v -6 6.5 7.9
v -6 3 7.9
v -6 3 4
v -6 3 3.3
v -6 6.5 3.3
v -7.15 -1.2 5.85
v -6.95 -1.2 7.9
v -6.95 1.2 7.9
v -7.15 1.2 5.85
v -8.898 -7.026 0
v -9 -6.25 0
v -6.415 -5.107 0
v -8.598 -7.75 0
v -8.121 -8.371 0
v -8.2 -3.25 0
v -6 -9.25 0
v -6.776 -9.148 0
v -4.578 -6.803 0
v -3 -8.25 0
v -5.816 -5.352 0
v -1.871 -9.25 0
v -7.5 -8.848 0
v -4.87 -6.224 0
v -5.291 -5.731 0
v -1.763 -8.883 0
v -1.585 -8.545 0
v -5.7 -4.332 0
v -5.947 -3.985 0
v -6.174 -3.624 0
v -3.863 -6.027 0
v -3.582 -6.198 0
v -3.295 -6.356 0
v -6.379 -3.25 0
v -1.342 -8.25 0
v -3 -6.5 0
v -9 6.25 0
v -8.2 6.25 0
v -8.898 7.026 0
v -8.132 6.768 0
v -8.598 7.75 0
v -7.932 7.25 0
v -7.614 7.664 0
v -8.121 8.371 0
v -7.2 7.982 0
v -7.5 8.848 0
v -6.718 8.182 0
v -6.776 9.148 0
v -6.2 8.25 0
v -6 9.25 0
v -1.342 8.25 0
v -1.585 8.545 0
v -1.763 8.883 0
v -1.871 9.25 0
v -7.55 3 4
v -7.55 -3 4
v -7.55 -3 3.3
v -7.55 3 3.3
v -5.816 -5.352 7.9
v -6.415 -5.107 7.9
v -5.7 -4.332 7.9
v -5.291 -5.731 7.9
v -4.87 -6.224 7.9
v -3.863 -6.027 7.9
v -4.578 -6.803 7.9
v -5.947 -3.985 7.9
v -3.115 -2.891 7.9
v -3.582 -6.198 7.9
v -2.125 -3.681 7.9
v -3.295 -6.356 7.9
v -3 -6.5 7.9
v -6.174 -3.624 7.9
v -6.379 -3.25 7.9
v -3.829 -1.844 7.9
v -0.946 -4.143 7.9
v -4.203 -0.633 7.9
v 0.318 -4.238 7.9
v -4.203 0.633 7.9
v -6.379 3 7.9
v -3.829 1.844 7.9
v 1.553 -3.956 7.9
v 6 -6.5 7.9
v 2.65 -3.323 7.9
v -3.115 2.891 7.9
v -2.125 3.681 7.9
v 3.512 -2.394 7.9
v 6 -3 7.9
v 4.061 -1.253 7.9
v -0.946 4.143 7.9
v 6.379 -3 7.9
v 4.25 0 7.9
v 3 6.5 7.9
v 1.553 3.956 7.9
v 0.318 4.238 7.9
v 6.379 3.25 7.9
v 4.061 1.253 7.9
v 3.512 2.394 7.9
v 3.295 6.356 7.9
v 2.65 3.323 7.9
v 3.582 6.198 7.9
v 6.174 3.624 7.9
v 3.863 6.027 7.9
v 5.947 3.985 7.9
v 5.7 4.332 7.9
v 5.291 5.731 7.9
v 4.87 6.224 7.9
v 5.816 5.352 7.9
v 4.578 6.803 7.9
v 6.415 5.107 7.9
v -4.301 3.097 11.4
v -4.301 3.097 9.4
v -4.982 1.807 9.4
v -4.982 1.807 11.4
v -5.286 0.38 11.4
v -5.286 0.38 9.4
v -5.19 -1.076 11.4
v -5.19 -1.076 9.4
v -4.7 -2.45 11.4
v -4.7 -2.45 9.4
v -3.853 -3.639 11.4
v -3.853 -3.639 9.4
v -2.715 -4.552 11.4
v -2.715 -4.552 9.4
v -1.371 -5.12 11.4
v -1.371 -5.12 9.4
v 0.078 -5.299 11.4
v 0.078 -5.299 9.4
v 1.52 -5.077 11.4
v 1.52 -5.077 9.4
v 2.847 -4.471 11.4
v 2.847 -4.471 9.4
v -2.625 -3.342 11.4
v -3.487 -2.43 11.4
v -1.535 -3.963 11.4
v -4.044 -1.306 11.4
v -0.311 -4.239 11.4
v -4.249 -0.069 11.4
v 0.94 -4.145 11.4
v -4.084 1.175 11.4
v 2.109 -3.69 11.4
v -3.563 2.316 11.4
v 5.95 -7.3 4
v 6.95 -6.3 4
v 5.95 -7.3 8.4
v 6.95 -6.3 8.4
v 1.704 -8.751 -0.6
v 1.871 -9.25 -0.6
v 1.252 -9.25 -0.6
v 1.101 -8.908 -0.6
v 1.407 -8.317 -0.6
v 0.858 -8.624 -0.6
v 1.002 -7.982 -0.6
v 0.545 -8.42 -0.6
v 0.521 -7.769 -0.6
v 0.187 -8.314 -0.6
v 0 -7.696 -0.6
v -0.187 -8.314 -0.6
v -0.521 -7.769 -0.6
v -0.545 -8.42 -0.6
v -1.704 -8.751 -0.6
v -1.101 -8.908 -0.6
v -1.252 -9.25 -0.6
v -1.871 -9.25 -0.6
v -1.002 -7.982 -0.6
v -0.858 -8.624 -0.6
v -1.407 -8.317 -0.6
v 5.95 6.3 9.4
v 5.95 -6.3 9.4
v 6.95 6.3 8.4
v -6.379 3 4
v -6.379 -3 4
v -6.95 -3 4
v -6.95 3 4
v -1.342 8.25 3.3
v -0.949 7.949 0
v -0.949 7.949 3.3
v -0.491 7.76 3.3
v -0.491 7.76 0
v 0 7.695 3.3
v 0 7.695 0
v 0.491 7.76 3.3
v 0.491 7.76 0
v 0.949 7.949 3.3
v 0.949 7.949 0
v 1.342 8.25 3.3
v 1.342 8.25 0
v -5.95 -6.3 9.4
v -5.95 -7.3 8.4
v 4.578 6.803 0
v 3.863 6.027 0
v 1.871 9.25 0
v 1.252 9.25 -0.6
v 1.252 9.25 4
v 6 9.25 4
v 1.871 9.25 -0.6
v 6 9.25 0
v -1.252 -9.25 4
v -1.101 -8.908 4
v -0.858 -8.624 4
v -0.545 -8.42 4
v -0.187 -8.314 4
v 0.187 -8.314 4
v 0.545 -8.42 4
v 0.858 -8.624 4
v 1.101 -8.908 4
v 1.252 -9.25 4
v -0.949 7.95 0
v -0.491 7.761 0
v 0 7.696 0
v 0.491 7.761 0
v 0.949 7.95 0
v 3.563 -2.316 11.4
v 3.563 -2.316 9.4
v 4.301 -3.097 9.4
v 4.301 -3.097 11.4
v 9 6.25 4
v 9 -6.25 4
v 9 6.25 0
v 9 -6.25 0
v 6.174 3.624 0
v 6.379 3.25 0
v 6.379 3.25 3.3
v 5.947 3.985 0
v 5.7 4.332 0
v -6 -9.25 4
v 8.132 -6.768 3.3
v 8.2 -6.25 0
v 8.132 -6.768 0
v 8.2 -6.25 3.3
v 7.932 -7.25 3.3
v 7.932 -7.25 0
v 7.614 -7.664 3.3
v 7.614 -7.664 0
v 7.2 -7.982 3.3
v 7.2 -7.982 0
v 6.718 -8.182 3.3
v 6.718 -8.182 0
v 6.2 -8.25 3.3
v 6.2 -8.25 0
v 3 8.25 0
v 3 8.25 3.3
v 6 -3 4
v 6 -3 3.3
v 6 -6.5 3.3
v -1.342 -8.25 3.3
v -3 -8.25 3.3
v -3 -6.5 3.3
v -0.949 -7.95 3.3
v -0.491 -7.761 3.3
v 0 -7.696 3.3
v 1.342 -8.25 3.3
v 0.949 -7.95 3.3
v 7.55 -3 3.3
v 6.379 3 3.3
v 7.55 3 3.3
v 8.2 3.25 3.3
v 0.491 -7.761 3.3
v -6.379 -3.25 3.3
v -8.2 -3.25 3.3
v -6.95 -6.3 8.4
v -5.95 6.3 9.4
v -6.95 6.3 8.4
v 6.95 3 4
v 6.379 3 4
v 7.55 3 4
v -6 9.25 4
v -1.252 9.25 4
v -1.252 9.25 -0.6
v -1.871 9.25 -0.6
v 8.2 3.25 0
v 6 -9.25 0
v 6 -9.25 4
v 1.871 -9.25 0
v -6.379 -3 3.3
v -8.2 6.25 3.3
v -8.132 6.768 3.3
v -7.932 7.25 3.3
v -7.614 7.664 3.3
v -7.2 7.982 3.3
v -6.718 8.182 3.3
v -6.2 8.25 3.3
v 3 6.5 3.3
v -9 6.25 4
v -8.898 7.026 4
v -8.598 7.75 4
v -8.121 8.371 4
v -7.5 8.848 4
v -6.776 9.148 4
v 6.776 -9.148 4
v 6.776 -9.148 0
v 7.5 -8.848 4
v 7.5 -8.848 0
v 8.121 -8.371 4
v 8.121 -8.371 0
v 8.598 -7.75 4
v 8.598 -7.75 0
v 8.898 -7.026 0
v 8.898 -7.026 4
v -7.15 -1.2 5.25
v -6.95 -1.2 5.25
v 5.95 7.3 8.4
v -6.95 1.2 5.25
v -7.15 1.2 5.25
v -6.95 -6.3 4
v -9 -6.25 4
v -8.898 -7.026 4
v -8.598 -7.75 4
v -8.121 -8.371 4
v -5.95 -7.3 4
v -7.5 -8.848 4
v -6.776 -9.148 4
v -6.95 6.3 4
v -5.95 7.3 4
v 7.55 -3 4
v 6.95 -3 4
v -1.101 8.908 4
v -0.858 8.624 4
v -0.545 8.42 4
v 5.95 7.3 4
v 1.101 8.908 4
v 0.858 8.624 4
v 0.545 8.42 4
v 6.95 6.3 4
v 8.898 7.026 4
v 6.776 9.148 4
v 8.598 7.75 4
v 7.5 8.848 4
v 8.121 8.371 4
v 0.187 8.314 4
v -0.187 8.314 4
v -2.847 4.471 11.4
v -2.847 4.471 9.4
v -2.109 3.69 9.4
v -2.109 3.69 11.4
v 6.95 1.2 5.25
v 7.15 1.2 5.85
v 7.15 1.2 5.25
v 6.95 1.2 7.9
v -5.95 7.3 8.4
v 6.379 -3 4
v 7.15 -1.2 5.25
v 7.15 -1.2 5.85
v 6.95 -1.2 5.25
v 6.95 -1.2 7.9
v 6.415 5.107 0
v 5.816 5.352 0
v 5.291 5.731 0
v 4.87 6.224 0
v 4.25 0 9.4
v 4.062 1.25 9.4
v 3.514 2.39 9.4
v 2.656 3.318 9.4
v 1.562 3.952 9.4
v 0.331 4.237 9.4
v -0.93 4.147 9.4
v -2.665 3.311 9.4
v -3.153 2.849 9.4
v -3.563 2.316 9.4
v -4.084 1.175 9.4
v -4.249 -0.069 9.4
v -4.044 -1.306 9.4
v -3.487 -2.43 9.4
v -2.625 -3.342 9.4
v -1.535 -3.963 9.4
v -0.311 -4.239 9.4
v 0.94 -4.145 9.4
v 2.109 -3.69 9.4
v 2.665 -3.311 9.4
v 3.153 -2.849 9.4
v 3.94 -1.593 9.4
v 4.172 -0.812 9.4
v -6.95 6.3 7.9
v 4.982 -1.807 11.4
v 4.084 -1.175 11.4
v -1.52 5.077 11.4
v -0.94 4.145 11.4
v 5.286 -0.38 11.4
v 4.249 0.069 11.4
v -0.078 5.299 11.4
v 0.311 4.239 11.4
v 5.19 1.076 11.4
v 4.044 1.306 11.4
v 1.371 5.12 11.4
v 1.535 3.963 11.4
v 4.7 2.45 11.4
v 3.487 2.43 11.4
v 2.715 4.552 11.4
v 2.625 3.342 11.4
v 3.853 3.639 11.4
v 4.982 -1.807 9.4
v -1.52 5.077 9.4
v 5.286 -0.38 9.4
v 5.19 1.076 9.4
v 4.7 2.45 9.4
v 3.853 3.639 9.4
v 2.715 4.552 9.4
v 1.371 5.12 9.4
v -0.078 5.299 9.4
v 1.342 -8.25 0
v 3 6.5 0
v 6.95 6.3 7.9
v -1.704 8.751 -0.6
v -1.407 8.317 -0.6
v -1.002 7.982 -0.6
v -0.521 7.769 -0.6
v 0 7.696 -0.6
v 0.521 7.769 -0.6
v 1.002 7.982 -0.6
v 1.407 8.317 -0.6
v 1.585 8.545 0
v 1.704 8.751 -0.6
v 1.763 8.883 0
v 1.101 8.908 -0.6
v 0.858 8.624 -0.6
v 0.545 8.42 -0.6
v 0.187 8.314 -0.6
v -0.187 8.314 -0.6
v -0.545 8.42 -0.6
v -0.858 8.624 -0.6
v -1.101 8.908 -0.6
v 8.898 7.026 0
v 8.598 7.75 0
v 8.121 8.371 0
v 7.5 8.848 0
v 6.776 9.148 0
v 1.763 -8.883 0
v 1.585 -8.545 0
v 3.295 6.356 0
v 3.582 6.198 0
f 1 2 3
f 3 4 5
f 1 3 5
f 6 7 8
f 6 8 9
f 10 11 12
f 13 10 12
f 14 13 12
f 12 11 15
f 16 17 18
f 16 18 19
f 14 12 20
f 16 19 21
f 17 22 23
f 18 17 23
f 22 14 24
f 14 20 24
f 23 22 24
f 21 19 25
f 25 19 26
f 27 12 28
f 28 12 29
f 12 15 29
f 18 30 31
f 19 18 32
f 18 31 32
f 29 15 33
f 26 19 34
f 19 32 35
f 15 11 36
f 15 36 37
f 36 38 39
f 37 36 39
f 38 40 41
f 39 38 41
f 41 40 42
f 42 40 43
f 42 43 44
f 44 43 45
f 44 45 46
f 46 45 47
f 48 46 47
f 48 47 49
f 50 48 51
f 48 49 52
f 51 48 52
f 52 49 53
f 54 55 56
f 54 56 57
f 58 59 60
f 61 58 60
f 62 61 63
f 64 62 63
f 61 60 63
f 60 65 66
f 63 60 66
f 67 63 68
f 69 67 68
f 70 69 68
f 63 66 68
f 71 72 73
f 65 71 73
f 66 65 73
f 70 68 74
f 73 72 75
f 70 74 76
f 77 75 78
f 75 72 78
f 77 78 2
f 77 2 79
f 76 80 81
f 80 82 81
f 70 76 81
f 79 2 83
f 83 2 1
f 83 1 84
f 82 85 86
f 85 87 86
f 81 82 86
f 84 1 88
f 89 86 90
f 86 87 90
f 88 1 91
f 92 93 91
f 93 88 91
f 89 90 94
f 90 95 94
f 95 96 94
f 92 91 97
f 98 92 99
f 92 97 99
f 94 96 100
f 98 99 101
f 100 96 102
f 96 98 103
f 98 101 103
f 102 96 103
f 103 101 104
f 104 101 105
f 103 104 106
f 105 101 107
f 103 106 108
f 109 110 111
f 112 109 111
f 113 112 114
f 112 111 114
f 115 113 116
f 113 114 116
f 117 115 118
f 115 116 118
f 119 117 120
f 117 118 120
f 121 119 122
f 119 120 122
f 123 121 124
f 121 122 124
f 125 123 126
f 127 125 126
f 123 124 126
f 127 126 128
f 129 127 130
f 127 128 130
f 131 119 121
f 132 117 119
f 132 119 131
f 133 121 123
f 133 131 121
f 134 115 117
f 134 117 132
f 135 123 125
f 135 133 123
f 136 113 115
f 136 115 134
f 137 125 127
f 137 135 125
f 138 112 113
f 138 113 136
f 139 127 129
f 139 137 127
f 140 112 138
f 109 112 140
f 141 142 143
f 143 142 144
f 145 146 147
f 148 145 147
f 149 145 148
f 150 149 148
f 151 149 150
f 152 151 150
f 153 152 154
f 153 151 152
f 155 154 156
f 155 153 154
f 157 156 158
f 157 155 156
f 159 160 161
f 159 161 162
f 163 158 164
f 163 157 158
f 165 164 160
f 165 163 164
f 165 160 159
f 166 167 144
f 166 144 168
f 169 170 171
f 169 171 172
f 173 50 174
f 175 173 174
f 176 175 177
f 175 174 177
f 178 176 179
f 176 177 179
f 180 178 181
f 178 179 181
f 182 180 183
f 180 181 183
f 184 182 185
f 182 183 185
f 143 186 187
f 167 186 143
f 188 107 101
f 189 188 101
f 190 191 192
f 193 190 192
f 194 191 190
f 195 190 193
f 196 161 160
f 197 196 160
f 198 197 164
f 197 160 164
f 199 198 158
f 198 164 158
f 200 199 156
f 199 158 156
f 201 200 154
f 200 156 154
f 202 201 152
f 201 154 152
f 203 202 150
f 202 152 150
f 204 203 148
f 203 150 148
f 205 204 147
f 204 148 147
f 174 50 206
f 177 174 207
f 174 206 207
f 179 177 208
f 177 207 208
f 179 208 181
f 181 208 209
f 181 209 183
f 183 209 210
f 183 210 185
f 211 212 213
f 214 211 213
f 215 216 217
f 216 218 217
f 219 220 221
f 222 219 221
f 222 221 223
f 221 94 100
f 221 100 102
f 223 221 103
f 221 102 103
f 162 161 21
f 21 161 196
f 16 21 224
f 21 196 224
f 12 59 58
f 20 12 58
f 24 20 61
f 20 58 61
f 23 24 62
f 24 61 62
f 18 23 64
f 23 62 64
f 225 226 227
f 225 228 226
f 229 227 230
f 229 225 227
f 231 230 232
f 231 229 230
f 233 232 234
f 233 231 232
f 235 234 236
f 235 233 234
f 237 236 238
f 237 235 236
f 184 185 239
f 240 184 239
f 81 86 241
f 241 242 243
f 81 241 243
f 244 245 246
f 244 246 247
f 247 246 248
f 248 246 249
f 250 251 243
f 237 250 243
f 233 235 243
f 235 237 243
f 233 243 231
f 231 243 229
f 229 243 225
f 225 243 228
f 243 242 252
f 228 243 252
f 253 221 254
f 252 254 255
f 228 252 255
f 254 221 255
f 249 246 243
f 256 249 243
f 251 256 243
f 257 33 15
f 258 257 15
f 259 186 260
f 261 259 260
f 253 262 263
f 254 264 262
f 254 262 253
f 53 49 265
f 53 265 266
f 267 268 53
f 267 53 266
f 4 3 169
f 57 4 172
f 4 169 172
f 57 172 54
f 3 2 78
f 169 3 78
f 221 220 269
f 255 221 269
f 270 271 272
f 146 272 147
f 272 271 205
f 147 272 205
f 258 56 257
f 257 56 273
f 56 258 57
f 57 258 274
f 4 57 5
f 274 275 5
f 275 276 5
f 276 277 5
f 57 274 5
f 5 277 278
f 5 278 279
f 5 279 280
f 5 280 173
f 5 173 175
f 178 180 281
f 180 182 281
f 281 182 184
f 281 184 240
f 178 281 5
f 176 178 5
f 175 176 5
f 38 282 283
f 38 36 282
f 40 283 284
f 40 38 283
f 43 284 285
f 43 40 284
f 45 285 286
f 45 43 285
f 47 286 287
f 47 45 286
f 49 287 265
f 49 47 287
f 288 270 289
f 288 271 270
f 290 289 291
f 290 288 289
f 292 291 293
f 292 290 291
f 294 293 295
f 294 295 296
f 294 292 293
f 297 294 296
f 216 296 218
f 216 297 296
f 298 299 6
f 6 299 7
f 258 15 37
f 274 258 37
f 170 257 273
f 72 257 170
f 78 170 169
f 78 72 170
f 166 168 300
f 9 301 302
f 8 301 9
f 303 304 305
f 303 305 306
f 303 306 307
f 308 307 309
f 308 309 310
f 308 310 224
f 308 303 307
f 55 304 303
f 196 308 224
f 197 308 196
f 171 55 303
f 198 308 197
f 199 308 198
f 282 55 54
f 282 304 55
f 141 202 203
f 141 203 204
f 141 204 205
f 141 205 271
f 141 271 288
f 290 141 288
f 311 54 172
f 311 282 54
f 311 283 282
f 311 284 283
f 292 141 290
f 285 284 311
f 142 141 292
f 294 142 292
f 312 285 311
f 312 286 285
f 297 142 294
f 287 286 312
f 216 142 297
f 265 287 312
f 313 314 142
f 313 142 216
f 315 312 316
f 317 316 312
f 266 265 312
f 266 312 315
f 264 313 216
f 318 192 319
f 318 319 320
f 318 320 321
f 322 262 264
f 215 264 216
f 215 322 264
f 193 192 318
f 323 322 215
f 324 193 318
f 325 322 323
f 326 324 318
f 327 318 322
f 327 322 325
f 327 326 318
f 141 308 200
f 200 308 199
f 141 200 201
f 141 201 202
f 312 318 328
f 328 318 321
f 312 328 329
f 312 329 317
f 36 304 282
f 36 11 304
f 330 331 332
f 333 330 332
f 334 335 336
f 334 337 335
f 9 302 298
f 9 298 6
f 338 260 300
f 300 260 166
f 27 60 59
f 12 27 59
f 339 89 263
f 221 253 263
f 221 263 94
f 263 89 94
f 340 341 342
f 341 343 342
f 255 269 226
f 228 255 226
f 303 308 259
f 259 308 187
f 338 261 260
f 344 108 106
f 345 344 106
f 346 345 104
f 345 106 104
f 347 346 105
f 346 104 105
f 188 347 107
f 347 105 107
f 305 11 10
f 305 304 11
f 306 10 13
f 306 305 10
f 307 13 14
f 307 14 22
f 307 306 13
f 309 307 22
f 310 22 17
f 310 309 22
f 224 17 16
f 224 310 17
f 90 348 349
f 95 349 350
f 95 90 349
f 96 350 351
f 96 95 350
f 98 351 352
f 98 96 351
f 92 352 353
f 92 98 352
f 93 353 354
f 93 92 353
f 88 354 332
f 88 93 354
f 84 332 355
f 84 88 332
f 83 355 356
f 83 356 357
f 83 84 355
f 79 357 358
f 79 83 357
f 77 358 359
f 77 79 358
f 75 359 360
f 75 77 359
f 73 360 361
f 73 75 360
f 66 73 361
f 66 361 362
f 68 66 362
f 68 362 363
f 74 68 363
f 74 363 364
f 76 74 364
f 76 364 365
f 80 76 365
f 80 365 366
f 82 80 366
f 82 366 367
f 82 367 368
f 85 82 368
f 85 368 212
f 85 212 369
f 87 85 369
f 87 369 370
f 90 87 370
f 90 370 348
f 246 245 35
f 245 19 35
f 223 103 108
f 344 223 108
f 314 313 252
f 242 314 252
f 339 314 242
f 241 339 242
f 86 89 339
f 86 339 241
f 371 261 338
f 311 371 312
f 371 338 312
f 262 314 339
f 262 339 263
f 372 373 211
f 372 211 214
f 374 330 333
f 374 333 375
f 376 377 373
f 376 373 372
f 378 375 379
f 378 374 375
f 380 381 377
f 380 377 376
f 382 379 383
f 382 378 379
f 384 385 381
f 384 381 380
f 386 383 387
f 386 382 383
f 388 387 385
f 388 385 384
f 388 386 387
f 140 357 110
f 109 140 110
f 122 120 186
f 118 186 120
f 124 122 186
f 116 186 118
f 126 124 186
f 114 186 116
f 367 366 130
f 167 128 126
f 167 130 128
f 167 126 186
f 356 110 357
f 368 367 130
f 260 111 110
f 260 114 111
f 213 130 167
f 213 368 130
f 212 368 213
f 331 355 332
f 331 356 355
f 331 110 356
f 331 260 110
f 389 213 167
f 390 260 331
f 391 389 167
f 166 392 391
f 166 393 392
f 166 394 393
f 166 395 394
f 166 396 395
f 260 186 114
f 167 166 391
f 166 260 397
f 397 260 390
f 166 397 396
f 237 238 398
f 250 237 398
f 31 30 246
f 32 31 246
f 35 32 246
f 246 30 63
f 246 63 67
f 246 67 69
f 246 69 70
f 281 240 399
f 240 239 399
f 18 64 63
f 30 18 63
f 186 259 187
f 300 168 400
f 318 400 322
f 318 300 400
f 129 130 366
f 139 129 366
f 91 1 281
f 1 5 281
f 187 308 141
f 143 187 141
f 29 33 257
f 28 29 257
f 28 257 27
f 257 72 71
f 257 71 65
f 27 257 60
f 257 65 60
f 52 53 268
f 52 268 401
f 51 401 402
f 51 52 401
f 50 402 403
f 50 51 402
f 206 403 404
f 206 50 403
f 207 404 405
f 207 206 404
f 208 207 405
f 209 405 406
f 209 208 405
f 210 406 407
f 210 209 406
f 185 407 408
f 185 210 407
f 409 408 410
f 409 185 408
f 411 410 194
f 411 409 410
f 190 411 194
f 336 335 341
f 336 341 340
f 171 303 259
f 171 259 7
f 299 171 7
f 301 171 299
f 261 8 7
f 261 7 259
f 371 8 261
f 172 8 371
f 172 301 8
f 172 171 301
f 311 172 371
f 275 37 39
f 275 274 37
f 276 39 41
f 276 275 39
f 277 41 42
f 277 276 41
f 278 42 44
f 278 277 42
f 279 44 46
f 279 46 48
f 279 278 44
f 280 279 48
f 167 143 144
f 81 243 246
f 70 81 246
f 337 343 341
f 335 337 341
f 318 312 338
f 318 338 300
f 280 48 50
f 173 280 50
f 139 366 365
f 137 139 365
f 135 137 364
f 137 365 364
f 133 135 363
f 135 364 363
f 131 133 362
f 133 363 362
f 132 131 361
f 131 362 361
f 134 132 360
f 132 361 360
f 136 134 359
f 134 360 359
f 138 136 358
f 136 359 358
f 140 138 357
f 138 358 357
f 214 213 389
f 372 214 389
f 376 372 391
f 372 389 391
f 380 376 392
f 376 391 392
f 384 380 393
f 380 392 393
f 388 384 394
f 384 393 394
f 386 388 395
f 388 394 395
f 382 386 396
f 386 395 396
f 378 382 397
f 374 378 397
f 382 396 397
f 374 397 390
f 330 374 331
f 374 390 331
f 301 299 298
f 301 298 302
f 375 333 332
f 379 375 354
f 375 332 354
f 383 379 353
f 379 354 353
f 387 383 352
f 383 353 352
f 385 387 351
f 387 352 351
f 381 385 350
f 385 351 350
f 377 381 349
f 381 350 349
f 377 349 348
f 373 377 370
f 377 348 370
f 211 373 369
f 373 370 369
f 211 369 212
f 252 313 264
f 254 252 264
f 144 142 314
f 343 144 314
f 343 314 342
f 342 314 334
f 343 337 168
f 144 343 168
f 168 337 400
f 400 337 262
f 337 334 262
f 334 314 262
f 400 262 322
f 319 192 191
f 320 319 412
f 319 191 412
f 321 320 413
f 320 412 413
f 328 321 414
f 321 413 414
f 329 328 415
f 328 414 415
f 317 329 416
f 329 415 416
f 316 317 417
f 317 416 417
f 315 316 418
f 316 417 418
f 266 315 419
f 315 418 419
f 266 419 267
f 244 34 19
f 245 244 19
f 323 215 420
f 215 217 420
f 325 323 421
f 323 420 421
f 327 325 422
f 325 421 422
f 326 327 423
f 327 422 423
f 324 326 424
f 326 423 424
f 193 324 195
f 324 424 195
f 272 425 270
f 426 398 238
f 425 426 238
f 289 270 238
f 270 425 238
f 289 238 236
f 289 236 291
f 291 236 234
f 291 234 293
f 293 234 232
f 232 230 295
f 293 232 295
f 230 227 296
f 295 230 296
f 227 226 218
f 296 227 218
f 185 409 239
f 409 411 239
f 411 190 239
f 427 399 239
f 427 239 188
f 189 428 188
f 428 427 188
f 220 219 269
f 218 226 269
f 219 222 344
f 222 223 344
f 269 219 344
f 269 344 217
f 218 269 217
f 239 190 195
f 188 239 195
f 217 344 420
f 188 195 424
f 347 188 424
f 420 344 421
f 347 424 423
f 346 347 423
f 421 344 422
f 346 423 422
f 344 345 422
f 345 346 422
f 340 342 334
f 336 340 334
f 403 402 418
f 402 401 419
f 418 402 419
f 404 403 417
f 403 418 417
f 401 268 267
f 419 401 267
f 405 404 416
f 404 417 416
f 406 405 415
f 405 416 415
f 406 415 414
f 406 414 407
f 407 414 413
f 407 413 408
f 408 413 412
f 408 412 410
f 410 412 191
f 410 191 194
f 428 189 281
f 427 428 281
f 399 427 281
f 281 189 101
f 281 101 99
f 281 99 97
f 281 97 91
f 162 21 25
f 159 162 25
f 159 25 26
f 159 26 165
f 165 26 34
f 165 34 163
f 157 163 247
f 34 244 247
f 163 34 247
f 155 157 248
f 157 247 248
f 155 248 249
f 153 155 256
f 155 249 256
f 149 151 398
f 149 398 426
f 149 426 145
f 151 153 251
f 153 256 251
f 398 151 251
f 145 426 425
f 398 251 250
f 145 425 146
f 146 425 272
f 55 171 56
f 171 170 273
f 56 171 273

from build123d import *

# Parameters (mm, degrees)
SKETCH1_W            = 18
SKETCH1_H            = 18.5
BOSS_EXTRUDE1_DEPTH  = 3.3
SKETCH2_W            = 18
SKETCH2_H            = 18.5
BOSS_EXTRUDE2_DEPTH  = 0.7
FILLET1_R            = 3
SKETCH3_W            = 13.9
SKETCH3_H            = 14.6
BOSS_EXTRUDE3_DEPTH  = 3.9
SKETCH4_W            = 13.9
SKETCH4_H            = 14.6
SKETCH4_R            = 4.25
BOSS_EXTRUDE4_DEPTH  = 1.5
CHAMFER1_SIZE        = 1
BOSS_EXTRUDE5_DEPTH  = 2
SKETCH6_W            = 0.6
SKETCH6_H            = 6
CUT_EXTRUDE1_DEPTH   = 15.876911642
SKETCH7_W            = 0.7
SKETCH7_H            = 6
CUT_EXTRUDE2_DEPTH   = 14
SKETCH8_W            = 2.65
SKETCH8_H            = 2.4
BOSS_EXTRUDE6_DEPTH  = 0.2
SKETCH9_W            = 2.65
SKETCH9_H            = 2.4
BOSS_EXTRUDE7_DEPTH  = 0.2
CUT_EXTRUDE3_DEPTH   = 18.893085257
CUT_EXTRUDE5_START   = -7.9
CUT_EXTRUDE5_DEPTH   = 7.9
CUT_EXTRUDE7_START   = -4.6
SKETCH12_W           = 0.378675411
SKETCH12_H           = 6.25
CUT_EXTRUDE7_DEPTH   = 4.6
BOSS_EXTRUDE10_DEPTH = 3.3
FILLET2_R            = 2
BOSS_EXTRUDE11_DEPTH = 0.6
SKETCH15_R           = 1.3
CUT_EXTRUDE8_DEPTH   = 18.622783549


with BuildPart() as part:
    # Sketch1 → Boss-Extrude1 (new body)
    with BuildSketch(Plane.XY):
        Rectangle(SKETCH1_W, SKETCH1_H)
        Polygon((-3, -8.25), (-3, -3.25), (-8.2, -3.25), (-8.2, 8.25), (3, 8.25), (3, 3.25), (7.473843231, 3.25), (8.2, 3.25), (8.2, -8.25), align=None, mode=Mode.SUBTRACT)
    extrude(amount=BOSS_EXTRUDE1_DEPTH)

    # Sketch2 → Boss-Extrude2 (add)
    with BuildSketch(Plane.XY.offset(3.3)):
        Rectangle(SKETCH2_W, SKETCH2_H)
        Polygon((-6, 6.5), (3, 6.5), (3, 3.25), (6, 3.25), (6, -6.5), (-3, -6.5), (-3, -3.25), (-6, -3.25), align=None, mode=Mode.SUBTRACT)
    extrude(amount=BOSS_EXTRUDE2_DEPTH)

    # Fillet1
    fillet1_edges = [part.edges().sort_by_distance(p)[0] for p in [
        (-9, 9.25, 2),
        (9, 9.25, 2),
        (9, -9.25, 2),
        (-9, -9.25, 2),
    ]]
    fillet(fillet1_edges, radius=FILLET1_R)

    # Sketch3 → Boss-Extrude3 (add)
    with BuildSketch(Plane.XY.offset(4)):
        Rectangle(SKETCH3_W, SKETCH3_H)
        Polygon((-6, 6.5), (3, 6.5), (3, 3.25), (6, 3.25), (6, -6.5), (-3, -6.5), (-3, -3.25), (-6, -3.25), align=None, mode=Mode.SUBTRACT)
    extrude(amount=BOSS_EXTRUDE3_DEPTH)

    # Sketch4 → Boss-Extrude4 (add)
    with BuildSketch(Plane.XY.offset(7.9)):
        Rectangle(SKETCH4_W, SKETCH4_H)
        Circle(SKETCH4_R, mode=Mode.SUBTRACT)
    extrude(amount=BOSS_EXTRUDE4_DEPTH)

    # Chamfer1
    chamfer1_edges = [part.edges().sort_by_distance(p)[0] for p in [
        (-6.95, 7.3, 6.7),
        (-6.95, -7.3, 6.7),
        (6.95, -7.3, 6.7),
        (6.95, 7.3, 6.7),
        (-6.95, 0, 9.4),
        (0, -7.3, 9.4),
        (6.95, 0, 9.4),
        (0, 7.3, 9.4),
    ]]
    chamfer(chamfer1_edges, length=CHAMFER1_SIZE)

    # Sketch5 → Boss-Extrude5 (add)
    with BuildSketch(Plane.XY.offset(9.4)):
        with BuildLine():
            Line((-2.846728769, 4.470585567), (-2.109207508, 3.689680703))
            ThreePointArc((-2.109207508, 3.689680703), (3.089805898, 2.918150015), (3.563233813, -2.316433637))
            Line((3.563233813, -2.316433637), (4.300755074, -3.097338502))
            ThreePointArc((4.300755074, -3.097338502), (3.853169709, 3.639104725), (-2.846728769, 4.470585567))
        make_face()
        with BuildLine():
            Line((2.846728769, -4.470585567), (2.109207508, -3.689680703))
            ThreePointArc((2.109207508, -3.689680703), (-3.089805898, -2.918150015), (-3.563233813, 2.316433637))
            Line((-3.563233813, 2.316433637), (-4.300755074, 3.097338502))
            ThreePointArc((-4.300755074, 3.097338502), (-3.853169709, -3.639104725), (2.846728769, -4.470585567))
        make_face()
    extrude(amount=BOSS_EXTRUDE5_DEPTH)

    # Sketch6 → Cut-Extrude1 (cut, through all)
    with BuildSketch(Plane.XY.offset(4)):
        with Locations((7.25, 0)):
            Rectangle(SKETCH6_W, SKETCH6_H)
        with Locations((-7.25, 0)):
            Rectangle(SKETCH6_W, SKETCH6_H)
    extrude(amount=-CUT_EXTRUDE1_DEPTH, mode=Mode.SUBTRACT)

    # Sketch7 → Cut-Extrude2 (cut)
    with BuildSketch(Plane(origin=(6.95, 0, 0), x_dir=(0, 0, -1), z_dir=(1, 0, 0))):
        with Locations((-3.65, 0)):
            Rectangle(SKETCH7_W, SKETCH7_H)
    extrude(amount=-CUT_EXTRUDE2_DEPTH, mode=Mode.SUBTRACT)

    # Sketch8 → Boss-Extrude6 (add)
    with BuildSketch(Plane(origin=(6.95, 0, 0), x_dir=(0, 0, -1), z_dir=(1, 0, 0))):
        with Locations((-6.575, 0)):
            Rectangle(SKETCH8_W, SKETCH8_H)
    extrude(amount=BOSS_EXTRUDE6_DEPTH)

    # Sketch9 → Boss-Extrude7 (add)
    with BuildSketch(Plane.ZY.offset(6.95)):
        with Locations((6.575, 0)):
            Rectangle(SKETCH9_W, SKETCH9_H)
    extrude(amount=BOSS_EXTRUDE7_DEPTH)

    # Sketch10 → Cut-Extrude3 (cut, through all)
    with BuildSketch(Plane.XZ.offset(1.2)):
        Polygon((-6.95, 7.9), (-7.15, 5.85), (-7.15, 7.9), align=None)
        Polygon((6.95, 7.9), (7.15, 5.85), (7.15, 7.9), align=None)
    extrude(amount=-CUT_EXTRUDE3_DEPTH, mode=Mode.SUBTRACT)

    # Sketch11 → Cut-Extrude5 (cut)
    with BuildSketch(Plane(origin=(0, 0, 0), x_dir=(-1, 0, 0), z_dir=(0, 0, -1)).offset(CUT_EXTRUDE5_START)):
        with BuildLine():
            Line((-4.578389967, 6.802818924), (-3.862648789, 6.027432648))
            ThreePointArc((-3.862648789, 6.027432648), (-3.439450113, 6.278549428), (-3, 6.5))
            Line((-3, 6.5), (-3, 3.25))
            Line((-3, 3.25), (-6.378675411, 3.25))
            ThreePointArc((-6.378675411, 3.25), (-6.063337952, 3.806039001), (-5.699657401, 4.331732391))
            Line((-5.699657401, 4.331732391), (-6.415398578, 5.107118667))
            ThreePointArc((-6.415398578, 5.107118667), (-5.290584801, 5.731466868), (-4.578389967, 6.802818924))
        make_face()
        with BuildLine():
            Line((4.578389967, -6.802818924), (3.862648789, -6.027432648))
            ThreePointArc((3.862648789, -6.027432648), (3.439450113, -6.278549428), (3, -6.5))
            Line((3, -6.5), (3, -3.25))
            Line((3, -3.25), (6.378675411, -3.25))
            ThreePointArc((6.378675411, -3.25), (6.063337952, -3.806039001), (5.699657401, -4.331732391))
            Line((5.699657401, -4.331732391), (6.415398578, -5.107118667))
            ThreePointArc((6.415398578, -5.107118667), (5.290584801, -5.731466868), (4.578389967, -6.802818924))
        make_face()
    extrude(amount=CUT_EXTRUDE5_DEPTH, mode=Mode.SUBTRACT)

    # Sketch12 → Cut-Extrude7 (cut)
    with BuildSketch(Plane(origin=(0, 0, 3.3), x_dir=(-1, 0, 0), z_dir=(0, 0, -1)).offset(CUT_EXTRUDE7_START)):
        with Locations((-6.189337705, 0.125)):
            Rectangle(SKETCH12_W, SKETCH12_H)
        with Locations((6.189337705, -0.125)):
            Rectangle(SKETCH12_W, SKETCH12_H)
    extrude(amount=CUT_EXTRUDE7_DEPTH, mode=Mode.SUBTRACT)

    # Sketch13 → Boss-Extrude10 (add)
    with BuildSketch(Plane(origin=(0, 0, 0), x_dir=(-1, 0, 0), z_dir=(0, 0, -1))):
        with BuildLine():
            Line((-1.342004098, -8.25), (1.342004098, -8.25))
            ThreePointArc((1.342004098, -8.25), (0, -7.69645725), (-1.342004098, -8.25))
        make_face()
        with BuildLine():
            Line((-1.342004098, 8.25), (1.342004098, 8.25))
            ThreePointArc((1.342004098, 8.25), (0, 7.695), (-1.342004098, 8.25))
        make_face()
    extrude(amount=-BOSS_EXTRUDE10_DEPTH)

    # Fillet2
    fillet2_edges = [part.edges().sort_by_distance(p)[0] for p in [
        (-8.2, 8.25, 1.65),
        (8.2, -8.25, 1.65),
    ]]
    fillet(fillet2_edges, radius=FILLET2_R)

    # Sketch14 → Boss-Extrude11 (add)
    with BuildSketch(Plane(origin=(0, 0, 0), x_dir=(-1, 0, 0), z_dir=(0, 0, -1))):
        with BuildLine():
            Line((-1.871089255, -9.25), (1.871089255, -9.25))
            ThreePointArc((1.871089255, -9.25), (0, -7.69645725), (-1.871089255, -9.25))
        make_face()
        with BuildLine():
            Line((-1.871089255, 9.25), (1.871089255, 9.25))
            ThreePointArc((1.871089255, 9.25), (0, 7.69645725), (-1.871089255, 9.25))
        make_face()
    extrude(amount=BOSS_EXTRUDE11_DEPTH)

    # Sketch15 → Cut-Extrude8 (cut, through all)
    with BuildSketch(Plane(origin=(0, 0, -0.6), x_dir=(-1, 0, 0), z_dir=(0, 0, -1))):
        with Locations((0, 9.6)):
            Circle(SKETCH15_R)
        with Locations((0, -9.6)):
            Circle(SKETCH15_R)
    extrude(amount=-CUT_EXTRUDE8_DEPTH, mode=Mode.SUBTRACT)


solid = part.part
